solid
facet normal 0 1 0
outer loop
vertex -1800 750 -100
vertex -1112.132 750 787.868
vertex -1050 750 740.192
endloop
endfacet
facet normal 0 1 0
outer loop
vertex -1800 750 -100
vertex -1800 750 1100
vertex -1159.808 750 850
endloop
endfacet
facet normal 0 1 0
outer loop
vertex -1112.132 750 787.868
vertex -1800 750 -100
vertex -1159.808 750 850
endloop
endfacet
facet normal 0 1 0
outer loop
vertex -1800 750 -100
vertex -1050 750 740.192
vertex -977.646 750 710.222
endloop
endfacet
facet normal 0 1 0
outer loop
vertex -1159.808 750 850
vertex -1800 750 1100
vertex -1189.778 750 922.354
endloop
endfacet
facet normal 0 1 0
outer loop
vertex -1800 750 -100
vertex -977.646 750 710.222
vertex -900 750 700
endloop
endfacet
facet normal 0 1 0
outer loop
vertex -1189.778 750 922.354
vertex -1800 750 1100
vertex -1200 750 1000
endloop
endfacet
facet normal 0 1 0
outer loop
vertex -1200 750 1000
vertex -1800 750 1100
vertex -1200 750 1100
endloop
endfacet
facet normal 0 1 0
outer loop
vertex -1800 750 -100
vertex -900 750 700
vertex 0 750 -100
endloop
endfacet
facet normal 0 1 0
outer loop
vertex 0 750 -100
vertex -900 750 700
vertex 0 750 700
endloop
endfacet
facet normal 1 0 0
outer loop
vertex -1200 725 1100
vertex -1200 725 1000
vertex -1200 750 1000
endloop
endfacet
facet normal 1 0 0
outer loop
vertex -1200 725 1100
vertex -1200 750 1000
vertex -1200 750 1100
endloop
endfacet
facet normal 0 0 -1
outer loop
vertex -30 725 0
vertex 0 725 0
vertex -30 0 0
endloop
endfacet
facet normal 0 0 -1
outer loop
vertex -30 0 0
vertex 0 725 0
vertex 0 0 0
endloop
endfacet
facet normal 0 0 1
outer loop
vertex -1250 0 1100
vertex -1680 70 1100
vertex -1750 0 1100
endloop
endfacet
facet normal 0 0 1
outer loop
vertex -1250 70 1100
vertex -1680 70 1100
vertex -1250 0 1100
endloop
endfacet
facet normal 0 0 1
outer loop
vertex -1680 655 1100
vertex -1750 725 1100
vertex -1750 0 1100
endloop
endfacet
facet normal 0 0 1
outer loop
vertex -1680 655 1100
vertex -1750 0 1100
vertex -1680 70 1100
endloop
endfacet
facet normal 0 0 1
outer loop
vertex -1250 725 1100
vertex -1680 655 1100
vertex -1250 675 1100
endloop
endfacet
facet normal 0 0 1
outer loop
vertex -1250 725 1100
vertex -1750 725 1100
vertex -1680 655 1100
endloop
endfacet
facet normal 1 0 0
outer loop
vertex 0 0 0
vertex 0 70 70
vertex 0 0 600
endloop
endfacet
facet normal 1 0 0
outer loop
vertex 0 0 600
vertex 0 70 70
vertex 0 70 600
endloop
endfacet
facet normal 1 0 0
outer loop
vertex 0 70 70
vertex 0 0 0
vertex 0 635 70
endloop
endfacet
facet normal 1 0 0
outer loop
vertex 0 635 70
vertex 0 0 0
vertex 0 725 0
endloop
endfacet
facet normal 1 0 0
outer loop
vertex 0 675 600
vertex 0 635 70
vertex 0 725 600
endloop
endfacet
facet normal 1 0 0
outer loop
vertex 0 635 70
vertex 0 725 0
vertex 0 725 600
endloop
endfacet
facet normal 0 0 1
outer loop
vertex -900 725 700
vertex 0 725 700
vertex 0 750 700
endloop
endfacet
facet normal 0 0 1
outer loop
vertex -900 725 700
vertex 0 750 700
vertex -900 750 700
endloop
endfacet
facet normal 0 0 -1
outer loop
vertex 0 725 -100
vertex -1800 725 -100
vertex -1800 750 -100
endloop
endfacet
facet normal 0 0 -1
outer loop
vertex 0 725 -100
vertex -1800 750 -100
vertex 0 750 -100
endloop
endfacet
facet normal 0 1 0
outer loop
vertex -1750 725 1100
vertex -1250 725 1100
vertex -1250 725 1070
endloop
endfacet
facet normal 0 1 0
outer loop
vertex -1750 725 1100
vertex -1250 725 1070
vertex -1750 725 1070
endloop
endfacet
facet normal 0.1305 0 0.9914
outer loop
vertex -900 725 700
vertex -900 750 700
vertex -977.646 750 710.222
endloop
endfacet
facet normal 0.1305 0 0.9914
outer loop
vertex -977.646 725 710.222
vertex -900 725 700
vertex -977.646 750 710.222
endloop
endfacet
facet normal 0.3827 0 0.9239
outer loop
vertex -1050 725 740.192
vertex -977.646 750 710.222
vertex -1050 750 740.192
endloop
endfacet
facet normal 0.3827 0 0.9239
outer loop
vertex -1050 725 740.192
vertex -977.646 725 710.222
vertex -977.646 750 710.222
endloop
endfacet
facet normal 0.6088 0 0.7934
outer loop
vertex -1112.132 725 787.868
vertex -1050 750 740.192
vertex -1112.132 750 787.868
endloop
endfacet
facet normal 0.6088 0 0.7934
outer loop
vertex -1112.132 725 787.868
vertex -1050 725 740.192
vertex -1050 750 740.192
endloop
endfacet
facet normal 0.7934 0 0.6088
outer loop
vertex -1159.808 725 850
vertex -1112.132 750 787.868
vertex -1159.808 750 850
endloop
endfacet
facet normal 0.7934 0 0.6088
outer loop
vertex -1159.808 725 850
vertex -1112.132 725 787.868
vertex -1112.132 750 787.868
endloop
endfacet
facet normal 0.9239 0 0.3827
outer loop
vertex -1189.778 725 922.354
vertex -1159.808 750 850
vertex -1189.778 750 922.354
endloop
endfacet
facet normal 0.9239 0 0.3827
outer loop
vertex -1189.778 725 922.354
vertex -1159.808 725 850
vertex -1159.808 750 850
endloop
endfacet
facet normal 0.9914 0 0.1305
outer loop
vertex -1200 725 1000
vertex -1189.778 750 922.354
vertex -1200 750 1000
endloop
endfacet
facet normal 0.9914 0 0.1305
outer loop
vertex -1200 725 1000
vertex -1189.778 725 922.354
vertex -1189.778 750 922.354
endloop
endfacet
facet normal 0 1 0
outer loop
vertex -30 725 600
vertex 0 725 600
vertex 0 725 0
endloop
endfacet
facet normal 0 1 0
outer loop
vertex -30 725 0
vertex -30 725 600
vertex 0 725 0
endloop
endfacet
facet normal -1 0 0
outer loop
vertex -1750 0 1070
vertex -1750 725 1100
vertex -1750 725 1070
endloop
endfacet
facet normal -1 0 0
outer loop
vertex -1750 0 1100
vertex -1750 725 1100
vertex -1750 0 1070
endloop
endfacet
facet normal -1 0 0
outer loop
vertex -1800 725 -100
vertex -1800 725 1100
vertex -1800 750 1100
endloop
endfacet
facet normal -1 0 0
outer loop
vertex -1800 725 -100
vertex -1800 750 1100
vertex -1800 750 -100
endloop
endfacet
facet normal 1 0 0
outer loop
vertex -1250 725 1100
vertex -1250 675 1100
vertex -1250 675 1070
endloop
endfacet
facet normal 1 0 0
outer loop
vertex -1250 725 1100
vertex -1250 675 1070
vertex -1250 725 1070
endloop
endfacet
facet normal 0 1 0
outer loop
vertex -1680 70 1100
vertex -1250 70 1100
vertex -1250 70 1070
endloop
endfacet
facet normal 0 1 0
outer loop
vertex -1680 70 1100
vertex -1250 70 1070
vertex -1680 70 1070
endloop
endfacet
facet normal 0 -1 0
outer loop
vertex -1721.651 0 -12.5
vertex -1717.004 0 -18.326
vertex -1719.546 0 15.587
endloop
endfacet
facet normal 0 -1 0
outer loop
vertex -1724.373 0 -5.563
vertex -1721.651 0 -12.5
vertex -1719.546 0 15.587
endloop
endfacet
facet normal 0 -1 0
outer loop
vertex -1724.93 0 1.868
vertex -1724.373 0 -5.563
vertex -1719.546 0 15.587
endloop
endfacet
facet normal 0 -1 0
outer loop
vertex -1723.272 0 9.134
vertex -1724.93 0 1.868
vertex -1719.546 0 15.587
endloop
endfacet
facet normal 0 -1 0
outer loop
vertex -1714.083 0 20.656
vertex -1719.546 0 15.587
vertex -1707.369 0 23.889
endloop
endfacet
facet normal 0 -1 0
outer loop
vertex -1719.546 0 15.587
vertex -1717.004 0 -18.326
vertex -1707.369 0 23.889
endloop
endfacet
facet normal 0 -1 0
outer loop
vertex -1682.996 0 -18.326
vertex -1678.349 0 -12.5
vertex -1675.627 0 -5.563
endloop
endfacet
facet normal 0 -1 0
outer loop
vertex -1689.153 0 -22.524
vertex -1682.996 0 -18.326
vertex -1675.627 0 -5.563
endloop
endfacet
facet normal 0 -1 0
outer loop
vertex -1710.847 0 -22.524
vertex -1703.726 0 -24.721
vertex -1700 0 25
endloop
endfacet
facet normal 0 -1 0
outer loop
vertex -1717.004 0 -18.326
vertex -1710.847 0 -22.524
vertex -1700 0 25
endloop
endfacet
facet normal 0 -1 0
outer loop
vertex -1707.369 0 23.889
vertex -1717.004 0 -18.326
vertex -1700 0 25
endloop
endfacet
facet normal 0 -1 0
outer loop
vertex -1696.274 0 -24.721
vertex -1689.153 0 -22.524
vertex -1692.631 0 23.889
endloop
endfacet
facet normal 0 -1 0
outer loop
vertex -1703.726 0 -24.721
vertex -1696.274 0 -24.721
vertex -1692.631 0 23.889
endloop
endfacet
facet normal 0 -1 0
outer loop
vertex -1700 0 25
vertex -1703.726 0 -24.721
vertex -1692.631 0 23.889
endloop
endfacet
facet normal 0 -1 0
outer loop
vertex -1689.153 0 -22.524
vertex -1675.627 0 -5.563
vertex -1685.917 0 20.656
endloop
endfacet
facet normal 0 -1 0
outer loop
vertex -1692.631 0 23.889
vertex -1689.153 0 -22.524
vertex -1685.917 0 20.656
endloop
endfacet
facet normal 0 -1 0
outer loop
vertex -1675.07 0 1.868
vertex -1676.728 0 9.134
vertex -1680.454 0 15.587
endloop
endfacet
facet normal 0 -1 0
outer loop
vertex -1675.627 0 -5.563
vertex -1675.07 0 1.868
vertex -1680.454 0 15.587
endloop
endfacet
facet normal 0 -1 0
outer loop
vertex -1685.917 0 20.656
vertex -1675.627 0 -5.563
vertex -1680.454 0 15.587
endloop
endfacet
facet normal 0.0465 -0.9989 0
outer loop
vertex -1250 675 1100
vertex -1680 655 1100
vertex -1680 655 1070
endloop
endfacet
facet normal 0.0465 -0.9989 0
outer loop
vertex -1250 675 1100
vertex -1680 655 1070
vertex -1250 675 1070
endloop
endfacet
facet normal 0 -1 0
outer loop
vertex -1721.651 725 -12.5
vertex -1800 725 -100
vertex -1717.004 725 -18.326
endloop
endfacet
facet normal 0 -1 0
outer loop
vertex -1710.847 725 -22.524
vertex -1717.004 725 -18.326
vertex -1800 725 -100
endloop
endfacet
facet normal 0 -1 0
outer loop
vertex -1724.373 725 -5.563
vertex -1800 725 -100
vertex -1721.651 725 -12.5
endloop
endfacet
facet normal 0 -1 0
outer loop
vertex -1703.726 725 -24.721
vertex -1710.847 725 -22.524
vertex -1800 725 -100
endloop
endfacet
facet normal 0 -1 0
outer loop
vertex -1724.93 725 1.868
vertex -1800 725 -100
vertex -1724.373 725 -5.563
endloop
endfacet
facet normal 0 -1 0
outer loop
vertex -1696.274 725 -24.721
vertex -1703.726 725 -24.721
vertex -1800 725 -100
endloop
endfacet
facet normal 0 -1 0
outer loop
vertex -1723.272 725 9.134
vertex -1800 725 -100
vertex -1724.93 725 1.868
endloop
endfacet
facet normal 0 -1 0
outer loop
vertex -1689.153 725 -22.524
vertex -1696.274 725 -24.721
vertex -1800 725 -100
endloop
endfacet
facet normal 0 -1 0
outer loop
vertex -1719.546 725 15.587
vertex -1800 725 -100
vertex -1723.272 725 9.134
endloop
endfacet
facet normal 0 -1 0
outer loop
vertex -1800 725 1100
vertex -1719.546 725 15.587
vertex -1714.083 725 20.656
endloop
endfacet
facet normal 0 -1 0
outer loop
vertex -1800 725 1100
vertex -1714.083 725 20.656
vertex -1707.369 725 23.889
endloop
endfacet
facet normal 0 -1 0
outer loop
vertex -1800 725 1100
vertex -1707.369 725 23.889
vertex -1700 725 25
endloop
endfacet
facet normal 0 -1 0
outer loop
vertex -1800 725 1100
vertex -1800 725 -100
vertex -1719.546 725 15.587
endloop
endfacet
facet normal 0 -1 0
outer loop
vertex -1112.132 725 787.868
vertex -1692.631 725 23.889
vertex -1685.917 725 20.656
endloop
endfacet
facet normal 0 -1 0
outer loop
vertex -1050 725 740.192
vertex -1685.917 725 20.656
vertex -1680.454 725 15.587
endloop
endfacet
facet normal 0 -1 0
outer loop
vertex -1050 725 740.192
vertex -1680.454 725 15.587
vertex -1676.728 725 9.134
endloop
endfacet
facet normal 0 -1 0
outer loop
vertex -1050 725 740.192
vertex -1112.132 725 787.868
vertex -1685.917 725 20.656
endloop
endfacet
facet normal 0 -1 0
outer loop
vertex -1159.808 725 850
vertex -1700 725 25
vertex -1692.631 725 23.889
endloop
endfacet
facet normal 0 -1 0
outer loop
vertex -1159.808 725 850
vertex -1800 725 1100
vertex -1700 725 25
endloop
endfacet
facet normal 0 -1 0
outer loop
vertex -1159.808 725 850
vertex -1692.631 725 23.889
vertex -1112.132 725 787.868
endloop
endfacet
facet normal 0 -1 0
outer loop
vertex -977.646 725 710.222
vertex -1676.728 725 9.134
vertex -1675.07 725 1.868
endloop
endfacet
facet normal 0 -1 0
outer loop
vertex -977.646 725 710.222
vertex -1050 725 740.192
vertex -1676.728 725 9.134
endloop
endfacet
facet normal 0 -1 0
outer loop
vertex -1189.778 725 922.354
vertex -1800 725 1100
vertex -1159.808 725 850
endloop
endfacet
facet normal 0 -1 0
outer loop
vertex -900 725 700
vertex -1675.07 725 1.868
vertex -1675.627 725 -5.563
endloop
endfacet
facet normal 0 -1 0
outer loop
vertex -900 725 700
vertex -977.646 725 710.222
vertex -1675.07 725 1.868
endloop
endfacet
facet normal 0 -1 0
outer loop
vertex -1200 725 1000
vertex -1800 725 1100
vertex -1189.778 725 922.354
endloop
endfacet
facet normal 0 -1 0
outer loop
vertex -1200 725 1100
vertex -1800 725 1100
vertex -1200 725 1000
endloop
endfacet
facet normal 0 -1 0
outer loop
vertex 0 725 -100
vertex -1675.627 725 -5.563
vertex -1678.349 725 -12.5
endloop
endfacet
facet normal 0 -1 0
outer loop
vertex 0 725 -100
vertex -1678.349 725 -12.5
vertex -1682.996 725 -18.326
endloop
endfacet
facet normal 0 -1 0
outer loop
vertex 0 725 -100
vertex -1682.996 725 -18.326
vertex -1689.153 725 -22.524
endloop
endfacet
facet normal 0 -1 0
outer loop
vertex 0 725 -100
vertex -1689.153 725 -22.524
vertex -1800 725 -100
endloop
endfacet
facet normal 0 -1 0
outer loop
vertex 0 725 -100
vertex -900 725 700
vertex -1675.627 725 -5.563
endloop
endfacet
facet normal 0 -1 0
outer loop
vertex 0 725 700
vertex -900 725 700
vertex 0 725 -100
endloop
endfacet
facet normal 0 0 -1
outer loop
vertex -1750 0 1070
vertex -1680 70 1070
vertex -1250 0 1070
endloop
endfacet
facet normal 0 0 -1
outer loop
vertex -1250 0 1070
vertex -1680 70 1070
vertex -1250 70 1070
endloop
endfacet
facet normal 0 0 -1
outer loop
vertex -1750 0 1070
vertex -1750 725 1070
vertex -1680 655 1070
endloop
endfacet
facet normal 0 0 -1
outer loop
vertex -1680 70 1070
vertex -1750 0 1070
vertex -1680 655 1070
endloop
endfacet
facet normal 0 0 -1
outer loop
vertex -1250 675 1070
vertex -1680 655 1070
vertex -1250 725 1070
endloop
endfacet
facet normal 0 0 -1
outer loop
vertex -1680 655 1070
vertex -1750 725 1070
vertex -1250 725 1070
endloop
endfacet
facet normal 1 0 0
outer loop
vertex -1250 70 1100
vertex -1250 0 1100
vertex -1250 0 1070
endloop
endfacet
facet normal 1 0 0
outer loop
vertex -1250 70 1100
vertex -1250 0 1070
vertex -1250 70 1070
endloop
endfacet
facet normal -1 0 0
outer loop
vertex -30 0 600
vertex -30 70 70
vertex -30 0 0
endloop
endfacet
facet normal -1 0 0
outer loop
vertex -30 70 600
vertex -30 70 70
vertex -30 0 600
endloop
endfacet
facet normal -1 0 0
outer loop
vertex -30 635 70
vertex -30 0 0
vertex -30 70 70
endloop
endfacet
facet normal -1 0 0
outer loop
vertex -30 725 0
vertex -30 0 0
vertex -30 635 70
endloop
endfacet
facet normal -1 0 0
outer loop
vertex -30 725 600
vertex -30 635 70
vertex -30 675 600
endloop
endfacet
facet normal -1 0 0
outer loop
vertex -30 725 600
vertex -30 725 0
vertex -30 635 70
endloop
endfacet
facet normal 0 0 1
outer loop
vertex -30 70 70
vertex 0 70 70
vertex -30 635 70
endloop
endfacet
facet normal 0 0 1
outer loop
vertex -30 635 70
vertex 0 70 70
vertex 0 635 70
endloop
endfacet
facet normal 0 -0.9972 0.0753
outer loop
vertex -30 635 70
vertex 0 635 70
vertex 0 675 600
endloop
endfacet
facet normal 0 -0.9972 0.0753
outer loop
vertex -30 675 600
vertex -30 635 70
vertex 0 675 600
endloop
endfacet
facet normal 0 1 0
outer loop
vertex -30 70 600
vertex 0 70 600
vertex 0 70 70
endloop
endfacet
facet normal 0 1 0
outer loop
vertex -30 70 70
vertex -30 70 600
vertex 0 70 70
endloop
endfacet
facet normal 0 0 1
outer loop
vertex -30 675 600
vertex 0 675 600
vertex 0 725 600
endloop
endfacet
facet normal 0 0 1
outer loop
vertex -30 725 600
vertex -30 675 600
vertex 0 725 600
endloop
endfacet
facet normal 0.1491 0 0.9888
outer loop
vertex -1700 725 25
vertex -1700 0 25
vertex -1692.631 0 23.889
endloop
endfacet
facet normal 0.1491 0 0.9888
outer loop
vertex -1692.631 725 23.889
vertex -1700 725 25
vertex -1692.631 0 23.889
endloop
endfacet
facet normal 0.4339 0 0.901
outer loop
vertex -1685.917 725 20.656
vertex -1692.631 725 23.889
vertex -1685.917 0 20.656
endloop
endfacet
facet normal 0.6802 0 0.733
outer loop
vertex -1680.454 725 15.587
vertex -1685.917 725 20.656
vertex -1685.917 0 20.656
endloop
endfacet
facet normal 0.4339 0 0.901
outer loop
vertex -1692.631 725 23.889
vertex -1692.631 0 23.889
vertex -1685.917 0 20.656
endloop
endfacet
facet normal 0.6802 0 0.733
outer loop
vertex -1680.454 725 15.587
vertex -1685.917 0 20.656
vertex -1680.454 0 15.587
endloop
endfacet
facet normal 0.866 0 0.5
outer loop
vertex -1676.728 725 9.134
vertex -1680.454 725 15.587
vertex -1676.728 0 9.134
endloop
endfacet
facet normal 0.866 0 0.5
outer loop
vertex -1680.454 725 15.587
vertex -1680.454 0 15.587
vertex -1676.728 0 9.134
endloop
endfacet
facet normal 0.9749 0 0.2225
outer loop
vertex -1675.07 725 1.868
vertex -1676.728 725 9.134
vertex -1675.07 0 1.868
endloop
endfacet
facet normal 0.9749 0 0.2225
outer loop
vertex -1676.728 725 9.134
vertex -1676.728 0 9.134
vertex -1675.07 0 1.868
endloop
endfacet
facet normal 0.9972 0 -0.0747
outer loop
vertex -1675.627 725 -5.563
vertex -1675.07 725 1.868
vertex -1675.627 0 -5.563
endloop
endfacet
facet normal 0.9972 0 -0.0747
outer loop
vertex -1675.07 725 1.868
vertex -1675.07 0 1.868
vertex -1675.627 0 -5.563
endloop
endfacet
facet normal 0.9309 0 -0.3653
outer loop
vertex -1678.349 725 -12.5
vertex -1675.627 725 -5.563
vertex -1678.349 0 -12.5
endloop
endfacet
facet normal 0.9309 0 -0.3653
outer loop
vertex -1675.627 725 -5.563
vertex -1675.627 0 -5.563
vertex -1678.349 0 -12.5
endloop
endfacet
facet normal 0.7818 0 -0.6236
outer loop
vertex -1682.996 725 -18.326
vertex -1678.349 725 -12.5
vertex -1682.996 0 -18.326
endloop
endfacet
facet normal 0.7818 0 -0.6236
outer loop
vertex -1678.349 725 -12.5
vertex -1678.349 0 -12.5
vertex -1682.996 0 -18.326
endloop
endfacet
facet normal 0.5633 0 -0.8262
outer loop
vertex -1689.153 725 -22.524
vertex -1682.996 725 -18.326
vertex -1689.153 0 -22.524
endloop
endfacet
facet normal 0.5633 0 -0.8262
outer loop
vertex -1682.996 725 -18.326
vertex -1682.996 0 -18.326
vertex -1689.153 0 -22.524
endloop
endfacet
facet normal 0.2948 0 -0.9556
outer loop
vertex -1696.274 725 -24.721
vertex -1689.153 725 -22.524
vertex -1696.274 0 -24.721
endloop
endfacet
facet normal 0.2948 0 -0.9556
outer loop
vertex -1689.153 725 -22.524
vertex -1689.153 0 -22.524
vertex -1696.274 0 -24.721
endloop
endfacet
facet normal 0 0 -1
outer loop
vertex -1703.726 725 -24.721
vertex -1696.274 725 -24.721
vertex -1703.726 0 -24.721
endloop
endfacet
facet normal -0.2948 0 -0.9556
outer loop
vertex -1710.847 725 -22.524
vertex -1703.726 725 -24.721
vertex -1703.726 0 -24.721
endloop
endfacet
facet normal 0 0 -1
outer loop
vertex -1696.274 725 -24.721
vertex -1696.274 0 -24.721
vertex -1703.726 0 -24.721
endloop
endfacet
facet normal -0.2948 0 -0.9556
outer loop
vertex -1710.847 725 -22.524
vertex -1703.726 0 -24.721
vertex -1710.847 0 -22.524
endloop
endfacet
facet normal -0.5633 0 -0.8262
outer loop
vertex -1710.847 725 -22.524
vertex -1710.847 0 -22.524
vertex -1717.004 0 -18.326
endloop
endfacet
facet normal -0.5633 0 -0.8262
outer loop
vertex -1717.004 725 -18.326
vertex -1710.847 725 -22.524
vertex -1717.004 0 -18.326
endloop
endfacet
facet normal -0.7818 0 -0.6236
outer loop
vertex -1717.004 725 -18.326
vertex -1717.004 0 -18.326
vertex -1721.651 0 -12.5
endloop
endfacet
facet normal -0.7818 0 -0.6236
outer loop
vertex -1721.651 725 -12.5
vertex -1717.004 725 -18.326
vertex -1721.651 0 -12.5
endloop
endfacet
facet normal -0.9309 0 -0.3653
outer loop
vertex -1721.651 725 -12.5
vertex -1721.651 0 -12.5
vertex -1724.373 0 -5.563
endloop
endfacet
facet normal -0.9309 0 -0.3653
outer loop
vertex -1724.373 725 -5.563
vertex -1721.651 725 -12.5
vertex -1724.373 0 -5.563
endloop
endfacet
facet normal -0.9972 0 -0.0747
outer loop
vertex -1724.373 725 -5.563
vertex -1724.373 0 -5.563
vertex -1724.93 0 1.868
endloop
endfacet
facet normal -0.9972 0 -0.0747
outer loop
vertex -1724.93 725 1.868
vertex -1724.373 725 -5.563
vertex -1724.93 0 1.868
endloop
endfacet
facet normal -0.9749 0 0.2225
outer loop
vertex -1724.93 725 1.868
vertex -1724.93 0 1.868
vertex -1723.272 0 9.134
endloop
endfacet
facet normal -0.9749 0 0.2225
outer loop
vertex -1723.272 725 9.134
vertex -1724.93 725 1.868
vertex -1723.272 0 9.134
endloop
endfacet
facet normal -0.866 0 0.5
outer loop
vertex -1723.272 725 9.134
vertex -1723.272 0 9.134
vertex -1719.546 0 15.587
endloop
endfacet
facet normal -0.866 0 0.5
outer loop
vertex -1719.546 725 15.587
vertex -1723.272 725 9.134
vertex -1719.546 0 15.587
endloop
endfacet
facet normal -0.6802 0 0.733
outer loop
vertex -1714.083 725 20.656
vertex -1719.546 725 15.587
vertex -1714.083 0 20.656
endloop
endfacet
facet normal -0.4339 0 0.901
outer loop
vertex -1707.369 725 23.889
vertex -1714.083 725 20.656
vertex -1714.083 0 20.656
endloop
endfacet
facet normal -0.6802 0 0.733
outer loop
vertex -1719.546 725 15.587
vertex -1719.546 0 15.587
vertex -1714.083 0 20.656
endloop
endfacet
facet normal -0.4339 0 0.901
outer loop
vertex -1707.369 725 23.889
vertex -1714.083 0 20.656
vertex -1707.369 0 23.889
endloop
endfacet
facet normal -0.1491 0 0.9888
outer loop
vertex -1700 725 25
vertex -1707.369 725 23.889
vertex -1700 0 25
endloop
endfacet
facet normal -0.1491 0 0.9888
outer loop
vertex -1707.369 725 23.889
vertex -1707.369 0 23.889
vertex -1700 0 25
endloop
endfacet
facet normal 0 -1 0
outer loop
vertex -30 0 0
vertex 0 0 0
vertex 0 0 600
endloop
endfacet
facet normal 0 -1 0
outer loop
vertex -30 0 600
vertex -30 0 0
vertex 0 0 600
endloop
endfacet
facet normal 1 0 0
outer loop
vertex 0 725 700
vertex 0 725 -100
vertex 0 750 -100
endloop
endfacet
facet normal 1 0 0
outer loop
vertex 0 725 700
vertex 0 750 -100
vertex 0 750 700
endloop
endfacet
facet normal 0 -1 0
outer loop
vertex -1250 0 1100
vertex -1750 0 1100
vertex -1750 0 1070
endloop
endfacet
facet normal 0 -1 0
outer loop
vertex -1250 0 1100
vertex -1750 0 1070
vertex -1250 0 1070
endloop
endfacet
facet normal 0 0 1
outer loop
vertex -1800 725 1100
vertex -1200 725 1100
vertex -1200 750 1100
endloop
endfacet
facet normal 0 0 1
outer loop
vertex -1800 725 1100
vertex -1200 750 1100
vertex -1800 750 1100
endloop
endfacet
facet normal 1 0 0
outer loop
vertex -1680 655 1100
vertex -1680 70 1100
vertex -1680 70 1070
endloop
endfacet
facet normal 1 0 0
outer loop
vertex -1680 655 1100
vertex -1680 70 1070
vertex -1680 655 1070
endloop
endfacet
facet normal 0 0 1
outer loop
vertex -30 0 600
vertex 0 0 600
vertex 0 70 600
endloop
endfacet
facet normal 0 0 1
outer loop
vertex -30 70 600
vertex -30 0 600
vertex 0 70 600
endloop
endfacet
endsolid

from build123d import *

# Parameters (mm, degrees)
EXTRUDE1_DEPTH = 30
EXTRUDE2_DEPTH = 25
EXTRUDE3_DEPTH = 30
SKETCH5_R      = 25
EXTRUDE4_DEPTH = 725


with BuildPart() as part:
    # Sketch1 → Extrude1 (new body)
    with BuildSketch(Plane(origin=(0, 0, 0), x_dir=(0, 0, -1), z_dir=(1, 0, 0))):
        Polygon((0, 0), (-600, 0), (-600, 70), (-70, 70), (-70, 635), (-600, 675), (-600, 725), (0, 725), align=None)
    extrude(amount=-EXTRUDE1_DEPTH)


with BuildPart() as body_2:
    # Sketch2 → Extrude2 (new body)
    with BuildSketch(Plane(origin=(0, 725, 0), x_dir=(-1, 0, 0), z_dir=(0, 1, 0))):
        with BuildLine():
            Line((0, 700), (900, 700))
            ThreePointArc((900, 700), (1112.132034356, 787.867965644), (1200, 1000))
            Line((1200, 1000), (1200, 1100))
            Line((1200, 1100), (1800, 1100))
            Line((1800, 1100), (1800, -100))
            Line((1800, -100), (0, -100))
            Line((0, -100), (0, 700))
        make_face()
    extrude(amount=EXTRUDE2_DEPTH)

    # Sketch5 → Extrude4 (add)
    with BuildSketch(Plane(origin=(0, 0, 0), x_dir=(1, 0, 0), z_dir=(0, 1, 0))):
        with Locations(Location((-1700, 0, 0), (0, 0, 270))):  # turned: the seam where the file's is
            Circle(SKETCH5_R)
    extrude(amount=EXTRUDE4_DEPTH)


with BuildPart() as body_3:
    # Sketch3 → Extrude3 (new body)
    with BuildSketch(Plane.XY.offset(1100)):
        Polygon((-1750, 725), (-1750, 0), (-1250, 0), (-1250, 70), (-1680, 70), (-1680, 655), (-1250, 675), (-1250, 725), align=None)
    extrude(amount=-EXTRUDE3_DEPTH)


solid = Compound([part.part, body_2.part, body_3.part])
